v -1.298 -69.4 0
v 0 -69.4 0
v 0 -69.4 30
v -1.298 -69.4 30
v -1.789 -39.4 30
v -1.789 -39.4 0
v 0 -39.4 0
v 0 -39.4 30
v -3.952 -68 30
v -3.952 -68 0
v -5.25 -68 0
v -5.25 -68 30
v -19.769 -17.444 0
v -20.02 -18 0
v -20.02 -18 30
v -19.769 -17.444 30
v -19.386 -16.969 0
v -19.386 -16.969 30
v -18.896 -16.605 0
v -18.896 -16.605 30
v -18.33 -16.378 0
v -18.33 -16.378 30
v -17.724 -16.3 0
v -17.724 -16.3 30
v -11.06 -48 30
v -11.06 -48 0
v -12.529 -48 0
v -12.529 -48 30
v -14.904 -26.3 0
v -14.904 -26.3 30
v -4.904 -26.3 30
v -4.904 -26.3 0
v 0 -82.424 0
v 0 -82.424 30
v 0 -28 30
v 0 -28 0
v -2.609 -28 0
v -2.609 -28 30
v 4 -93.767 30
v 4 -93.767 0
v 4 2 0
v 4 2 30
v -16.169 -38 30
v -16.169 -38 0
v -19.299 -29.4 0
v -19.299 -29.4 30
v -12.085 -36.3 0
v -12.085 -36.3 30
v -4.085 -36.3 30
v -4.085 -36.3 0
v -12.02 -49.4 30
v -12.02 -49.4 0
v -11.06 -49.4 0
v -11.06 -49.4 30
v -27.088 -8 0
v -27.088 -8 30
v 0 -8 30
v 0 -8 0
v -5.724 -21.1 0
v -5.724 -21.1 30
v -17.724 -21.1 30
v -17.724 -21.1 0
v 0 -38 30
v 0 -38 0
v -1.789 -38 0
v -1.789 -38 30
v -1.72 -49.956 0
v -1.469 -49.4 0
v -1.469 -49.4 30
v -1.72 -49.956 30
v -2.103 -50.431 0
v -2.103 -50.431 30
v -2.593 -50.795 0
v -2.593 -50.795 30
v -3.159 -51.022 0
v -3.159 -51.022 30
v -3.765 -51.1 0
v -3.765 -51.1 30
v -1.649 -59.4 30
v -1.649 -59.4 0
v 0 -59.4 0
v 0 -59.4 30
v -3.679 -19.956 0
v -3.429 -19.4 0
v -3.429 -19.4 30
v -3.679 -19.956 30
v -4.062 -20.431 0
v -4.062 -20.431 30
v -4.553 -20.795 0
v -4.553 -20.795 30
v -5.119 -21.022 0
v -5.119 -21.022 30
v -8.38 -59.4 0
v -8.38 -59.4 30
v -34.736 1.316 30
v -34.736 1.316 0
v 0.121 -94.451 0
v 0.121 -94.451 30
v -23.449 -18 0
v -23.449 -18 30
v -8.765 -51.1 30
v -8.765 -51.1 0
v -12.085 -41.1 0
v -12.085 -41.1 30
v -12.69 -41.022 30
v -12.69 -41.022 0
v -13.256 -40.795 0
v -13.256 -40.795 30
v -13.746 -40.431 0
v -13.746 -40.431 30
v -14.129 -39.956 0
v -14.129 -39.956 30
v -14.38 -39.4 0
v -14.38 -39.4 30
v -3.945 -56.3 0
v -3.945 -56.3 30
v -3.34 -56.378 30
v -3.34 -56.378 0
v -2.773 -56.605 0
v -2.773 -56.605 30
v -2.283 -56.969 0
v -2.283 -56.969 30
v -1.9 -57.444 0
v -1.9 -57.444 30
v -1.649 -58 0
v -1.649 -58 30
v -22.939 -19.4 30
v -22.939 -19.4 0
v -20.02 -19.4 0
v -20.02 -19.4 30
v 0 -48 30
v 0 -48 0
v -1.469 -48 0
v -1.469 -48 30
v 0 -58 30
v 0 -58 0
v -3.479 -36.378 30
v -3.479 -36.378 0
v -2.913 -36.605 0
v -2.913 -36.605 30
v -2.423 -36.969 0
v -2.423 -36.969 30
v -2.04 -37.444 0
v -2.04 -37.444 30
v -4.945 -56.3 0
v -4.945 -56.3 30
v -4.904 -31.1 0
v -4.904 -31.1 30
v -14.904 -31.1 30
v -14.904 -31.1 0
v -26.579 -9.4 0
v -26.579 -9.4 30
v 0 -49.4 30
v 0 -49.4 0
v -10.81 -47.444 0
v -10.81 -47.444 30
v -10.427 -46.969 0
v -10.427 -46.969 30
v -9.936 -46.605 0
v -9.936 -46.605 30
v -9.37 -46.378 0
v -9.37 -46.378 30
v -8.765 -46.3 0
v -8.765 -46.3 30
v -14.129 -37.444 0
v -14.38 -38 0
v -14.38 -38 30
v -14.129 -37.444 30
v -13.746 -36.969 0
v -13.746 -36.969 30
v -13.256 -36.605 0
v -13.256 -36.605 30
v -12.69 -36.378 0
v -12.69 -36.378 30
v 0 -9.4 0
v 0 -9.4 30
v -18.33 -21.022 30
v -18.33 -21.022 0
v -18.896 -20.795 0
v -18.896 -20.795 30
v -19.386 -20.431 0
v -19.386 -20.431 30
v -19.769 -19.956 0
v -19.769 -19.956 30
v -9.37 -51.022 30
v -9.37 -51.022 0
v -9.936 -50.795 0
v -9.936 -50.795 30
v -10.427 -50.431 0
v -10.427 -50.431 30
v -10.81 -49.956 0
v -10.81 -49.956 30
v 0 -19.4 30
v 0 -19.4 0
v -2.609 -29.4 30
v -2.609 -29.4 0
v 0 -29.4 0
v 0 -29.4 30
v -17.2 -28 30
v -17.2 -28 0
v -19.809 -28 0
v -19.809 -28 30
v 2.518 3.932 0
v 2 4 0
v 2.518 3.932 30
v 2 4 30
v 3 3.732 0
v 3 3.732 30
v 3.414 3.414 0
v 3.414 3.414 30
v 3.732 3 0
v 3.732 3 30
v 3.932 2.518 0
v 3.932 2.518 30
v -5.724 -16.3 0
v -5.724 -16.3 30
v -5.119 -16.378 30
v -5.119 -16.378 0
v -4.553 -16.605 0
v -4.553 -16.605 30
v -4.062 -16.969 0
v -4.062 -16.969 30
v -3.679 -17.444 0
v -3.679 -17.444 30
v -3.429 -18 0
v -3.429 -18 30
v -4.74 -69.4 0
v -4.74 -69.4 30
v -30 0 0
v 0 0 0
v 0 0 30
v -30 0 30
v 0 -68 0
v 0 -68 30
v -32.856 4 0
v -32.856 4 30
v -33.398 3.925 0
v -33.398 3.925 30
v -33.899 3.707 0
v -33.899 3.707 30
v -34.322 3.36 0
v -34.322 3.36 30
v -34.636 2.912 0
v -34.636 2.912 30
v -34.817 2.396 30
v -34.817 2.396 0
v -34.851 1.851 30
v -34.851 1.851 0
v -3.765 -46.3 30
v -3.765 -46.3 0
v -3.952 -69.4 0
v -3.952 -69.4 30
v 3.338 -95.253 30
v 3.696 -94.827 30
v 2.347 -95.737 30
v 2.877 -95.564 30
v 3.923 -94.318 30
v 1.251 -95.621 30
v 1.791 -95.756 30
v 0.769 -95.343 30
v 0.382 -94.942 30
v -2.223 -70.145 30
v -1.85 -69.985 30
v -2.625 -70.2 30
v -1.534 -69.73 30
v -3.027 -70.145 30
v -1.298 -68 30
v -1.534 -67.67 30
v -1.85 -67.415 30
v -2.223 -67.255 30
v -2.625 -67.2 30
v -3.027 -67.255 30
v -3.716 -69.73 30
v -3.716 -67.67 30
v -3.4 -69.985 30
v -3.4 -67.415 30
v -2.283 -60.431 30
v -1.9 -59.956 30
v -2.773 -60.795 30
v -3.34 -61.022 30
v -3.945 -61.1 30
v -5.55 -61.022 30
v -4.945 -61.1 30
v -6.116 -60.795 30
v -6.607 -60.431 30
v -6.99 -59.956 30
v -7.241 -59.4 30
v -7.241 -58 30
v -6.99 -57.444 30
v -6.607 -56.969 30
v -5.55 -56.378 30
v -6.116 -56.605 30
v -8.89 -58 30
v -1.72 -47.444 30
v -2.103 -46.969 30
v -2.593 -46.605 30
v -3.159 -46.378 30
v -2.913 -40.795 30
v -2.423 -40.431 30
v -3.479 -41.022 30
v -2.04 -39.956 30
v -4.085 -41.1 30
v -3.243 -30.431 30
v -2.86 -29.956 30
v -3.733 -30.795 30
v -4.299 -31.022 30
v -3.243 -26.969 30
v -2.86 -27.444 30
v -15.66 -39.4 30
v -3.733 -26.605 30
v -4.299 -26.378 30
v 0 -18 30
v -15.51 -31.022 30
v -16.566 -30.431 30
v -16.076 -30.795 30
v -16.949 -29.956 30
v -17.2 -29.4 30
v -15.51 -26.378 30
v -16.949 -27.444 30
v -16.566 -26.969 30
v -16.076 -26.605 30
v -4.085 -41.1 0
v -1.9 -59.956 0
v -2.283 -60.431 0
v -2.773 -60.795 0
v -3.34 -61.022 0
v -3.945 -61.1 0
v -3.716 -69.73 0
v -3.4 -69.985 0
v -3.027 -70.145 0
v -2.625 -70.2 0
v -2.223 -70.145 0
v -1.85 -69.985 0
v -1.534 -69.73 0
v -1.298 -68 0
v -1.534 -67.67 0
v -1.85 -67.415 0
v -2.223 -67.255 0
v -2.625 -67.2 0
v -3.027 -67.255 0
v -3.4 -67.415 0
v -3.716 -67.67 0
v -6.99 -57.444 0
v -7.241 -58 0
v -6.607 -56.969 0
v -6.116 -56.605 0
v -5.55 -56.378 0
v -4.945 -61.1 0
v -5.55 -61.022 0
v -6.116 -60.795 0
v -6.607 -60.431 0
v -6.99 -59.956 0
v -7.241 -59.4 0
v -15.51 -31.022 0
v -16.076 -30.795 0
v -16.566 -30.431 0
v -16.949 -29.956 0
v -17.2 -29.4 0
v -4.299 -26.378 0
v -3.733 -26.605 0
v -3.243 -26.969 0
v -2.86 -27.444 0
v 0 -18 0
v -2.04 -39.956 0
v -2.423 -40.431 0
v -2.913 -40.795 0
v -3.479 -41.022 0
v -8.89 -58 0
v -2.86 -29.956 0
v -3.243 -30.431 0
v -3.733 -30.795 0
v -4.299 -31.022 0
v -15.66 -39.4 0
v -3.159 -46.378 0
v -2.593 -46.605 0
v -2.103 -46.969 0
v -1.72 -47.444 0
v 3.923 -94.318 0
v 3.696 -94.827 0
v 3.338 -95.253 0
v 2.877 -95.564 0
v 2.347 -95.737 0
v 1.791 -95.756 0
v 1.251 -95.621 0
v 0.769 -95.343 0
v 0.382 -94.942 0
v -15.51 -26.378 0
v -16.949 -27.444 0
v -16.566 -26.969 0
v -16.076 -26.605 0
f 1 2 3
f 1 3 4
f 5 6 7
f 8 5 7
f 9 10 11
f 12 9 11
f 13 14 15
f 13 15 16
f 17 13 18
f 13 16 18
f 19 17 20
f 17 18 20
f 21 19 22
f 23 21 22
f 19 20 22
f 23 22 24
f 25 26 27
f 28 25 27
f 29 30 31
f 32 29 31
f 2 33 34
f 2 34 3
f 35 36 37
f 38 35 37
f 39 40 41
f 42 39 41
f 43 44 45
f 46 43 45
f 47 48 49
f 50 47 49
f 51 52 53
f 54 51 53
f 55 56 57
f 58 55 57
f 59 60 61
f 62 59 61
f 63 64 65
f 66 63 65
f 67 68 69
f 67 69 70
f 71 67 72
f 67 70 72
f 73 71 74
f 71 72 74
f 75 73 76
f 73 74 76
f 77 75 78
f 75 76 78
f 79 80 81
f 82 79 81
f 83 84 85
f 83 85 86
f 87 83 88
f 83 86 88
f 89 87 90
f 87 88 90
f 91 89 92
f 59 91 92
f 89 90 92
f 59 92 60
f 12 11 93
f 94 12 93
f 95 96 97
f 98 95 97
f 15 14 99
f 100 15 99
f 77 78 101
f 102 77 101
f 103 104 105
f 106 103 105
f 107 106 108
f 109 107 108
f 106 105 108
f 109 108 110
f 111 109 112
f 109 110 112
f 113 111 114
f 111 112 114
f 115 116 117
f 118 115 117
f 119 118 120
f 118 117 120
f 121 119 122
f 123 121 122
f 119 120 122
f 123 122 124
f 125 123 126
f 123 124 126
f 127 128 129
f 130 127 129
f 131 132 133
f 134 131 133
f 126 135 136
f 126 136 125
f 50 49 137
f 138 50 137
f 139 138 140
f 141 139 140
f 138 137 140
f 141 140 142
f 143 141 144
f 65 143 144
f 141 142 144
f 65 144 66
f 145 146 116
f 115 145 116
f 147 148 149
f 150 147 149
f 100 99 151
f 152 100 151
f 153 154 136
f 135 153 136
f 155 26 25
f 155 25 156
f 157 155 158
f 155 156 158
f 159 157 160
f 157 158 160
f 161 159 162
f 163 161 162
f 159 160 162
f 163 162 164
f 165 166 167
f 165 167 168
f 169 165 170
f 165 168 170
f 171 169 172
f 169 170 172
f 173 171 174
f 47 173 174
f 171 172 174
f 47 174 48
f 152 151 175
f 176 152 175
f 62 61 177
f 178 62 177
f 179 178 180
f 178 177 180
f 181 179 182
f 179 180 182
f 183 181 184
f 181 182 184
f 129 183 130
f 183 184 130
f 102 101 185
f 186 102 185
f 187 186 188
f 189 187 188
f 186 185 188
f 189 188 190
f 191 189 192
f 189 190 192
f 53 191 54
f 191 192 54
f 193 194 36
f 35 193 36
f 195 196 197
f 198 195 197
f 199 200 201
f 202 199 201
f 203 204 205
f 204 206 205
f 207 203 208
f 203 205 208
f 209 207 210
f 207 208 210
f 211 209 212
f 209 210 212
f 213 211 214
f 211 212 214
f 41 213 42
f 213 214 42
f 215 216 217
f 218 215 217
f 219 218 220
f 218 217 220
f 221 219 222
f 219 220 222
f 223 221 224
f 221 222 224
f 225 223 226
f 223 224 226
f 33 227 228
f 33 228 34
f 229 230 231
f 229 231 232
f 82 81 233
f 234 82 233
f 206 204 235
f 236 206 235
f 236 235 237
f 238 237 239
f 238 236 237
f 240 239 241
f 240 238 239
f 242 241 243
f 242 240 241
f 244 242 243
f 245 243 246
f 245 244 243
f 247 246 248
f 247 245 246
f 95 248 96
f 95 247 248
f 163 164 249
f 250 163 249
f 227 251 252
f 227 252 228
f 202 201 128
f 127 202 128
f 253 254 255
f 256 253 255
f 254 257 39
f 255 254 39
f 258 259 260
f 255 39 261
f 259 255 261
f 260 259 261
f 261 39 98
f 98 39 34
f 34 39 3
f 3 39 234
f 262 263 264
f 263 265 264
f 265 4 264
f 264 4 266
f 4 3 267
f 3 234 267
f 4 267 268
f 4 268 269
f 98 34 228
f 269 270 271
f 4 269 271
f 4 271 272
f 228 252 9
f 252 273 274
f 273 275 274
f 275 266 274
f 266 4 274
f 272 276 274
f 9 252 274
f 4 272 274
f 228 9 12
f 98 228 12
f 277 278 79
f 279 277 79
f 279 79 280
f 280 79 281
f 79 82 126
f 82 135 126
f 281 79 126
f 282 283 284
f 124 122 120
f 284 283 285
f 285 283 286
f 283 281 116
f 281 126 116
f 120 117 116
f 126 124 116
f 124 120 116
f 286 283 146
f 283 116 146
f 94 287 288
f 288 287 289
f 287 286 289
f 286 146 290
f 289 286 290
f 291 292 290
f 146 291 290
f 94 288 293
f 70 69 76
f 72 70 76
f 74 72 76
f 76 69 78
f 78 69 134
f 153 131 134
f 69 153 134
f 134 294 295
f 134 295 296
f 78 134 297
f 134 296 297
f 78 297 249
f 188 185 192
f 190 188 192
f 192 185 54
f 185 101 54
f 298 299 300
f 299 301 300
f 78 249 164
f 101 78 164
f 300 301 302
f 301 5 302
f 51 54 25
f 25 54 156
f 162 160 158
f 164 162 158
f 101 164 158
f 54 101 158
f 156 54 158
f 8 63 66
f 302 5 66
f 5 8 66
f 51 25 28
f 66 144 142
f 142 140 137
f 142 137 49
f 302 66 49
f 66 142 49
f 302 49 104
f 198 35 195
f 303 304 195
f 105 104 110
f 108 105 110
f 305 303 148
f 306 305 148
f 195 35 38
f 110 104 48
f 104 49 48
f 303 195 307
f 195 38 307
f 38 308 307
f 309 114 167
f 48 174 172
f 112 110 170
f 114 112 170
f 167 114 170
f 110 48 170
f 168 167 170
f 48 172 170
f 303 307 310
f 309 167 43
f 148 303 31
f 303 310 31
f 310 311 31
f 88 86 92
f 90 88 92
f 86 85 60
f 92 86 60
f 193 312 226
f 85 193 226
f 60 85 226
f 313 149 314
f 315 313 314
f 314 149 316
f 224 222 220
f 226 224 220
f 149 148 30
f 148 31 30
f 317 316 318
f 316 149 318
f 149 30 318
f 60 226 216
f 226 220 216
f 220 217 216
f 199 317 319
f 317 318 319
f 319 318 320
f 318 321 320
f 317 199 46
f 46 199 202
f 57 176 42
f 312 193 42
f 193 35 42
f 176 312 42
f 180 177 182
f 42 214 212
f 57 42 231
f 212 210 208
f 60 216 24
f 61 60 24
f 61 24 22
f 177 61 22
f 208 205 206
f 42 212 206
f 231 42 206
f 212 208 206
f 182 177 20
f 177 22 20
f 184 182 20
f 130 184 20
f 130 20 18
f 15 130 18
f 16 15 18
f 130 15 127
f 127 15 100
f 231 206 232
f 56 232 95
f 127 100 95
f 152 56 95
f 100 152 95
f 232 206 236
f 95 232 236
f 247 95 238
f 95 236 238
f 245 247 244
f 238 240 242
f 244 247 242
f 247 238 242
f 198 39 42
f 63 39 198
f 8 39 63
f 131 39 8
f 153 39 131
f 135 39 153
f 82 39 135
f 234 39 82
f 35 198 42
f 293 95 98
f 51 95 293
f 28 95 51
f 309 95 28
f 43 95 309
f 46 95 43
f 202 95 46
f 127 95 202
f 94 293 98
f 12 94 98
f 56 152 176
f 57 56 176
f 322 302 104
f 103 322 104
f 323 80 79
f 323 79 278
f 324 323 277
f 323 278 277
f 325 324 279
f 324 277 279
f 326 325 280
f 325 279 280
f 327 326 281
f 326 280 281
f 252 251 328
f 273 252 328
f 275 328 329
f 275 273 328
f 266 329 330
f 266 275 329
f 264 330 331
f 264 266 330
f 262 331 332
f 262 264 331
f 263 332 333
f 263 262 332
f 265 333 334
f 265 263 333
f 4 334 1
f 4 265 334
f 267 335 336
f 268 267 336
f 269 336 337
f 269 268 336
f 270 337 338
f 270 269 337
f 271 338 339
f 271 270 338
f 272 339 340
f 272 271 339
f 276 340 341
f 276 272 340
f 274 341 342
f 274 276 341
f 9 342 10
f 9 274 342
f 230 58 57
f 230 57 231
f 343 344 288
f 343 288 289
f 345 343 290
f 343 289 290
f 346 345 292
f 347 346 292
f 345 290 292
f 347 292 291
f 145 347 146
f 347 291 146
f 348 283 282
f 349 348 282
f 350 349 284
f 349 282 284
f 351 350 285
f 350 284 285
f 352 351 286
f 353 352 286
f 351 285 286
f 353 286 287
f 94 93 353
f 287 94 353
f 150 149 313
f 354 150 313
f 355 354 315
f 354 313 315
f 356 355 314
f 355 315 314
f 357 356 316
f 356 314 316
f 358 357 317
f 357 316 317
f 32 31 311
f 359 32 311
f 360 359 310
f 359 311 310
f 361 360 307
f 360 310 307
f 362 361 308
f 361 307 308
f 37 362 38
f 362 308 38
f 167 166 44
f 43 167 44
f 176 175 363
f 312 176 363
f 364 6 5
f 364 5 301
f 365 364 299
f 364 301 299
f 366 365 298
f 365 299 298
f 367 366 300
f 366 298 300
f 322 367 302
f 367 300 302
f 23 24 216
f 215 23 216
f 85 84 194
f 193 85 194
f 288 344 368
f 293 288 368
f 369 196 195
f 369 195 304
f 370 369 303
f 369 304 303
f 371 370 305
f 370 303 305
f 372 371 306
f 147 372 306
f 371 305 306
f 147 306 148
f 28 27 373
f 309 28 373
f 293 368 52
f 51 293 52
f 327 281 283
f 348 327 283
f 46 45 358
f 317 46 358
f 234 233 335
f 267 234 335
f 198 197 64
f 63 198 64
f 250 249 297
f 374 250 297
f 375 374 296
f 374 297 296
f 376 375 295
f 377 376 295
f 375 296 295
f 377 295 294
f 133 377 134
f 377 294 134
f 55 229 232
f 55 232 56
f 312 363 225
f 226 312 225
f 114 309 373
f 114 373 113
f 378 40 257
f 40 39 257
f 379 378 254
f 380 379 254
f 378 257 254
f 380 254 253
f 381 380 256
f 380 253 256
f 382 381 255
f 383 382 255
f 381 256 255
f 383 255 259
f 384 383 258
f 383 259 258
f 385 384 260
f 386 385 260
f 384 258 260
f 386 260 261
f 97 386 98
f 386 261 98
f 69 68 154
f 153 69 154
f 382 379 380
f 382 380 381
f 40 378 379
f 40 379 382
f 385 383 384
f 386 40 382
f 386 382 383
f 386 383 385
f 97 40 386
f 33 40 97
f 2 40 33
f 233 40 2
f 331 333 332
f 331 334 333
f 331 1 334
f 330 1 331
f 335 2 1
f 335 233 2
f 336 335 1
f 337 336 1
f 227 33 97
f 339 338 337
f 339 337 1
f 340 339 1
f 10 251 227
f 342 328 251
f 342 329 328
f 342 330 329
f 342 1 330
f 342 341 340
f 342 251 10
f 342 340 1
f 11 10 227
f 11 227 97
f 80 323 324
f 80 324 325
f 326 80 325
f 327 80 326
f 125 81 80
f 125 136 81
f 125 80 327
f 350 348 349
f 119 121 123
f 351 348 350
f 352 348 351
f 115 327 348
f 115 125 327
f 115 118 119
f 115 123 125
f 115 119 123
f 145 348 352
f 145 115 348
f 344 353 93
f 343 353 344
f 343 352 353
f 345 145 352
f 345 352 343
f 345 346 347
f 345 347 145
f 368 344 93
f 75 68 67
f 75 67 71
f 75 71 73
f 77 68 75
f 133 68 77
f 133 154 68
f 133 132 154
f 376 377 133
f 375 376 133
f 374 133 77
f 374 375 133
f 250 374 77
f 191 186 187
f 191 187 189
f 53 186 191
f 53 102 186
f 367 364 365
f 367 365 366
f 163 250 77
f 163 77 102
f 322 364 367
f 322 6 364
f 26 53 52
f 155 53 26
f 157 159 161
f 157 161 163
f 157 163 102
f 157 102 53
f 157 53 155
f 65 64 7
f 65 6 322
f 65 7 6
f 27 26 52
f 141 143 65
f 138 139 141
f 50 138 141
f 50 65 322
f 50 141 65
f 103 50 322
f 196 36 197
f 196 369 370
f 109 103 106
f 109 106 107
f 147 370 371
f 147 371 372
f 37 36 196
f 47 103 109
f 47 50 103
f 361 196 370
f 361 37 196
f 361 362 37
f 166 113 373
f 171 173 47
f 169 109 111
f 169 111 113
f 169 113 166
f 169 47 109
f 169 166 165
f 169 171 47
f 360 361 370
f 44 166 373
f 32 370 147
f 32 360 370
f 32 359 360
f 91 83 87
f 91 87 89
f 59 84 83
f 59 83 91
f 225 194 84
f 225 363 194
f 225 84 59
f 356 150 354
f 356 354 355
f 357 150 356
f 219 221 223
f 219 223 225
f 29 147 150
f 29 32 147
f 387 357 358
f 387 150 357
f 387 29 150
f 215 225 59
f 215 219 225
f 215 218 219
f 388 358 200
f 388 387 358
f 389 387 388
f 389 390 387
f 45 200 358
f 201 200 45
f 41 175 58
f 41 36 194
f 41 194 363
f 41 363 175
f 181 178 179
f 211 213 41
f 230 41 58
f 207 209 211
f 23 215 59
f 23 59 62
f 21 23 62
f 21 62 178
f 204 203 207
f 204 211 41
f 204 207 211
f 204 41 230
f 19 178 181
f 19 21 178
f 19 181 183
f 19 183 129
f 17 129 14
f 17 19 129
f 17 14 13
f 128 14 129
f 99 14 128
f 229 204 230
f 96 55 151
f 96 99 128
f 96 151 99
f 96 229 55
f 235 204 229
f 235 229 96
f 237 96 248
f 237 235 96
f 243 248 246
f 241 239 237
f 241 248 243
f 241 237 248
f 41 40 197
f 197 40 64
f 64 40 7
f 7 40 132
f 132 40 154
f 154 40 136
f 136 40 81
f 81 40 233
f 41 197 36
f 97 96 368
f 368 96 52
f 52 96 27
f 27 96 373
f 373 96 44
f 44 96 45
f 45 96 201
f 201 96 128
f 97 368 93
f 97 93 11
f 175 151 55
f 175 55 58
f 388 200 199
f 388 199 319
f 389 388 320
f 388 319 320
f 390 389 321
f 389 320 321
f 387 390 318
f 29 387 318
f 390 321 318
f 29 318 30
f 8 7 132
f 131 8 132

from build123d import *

# Parameters (mm, degrees)
BOSS_EXTRUDE2_DEPTH = 30
FILLET2_R           = 2
BOSS_EXTRUDE3_DEPTH = 30
SKETCH5_R           = 1.5
BOSS_EXTRUDE4_DEPTH = 30


with BuildPart() as part:
    # Sketch1 → Boss-Extrude2 (new body)
    with BuildSketch(Plane.XY):
        Polygon((4, 4), (-35.712592027, 4), (4, -105.109449862), align=None)
        Polygon((0, 0), (-30, 0), (-27.088238126, -8), (0, -8), align=None, mode=Mode.SUBTRACT)
        Polygon((0, -82.424322584), (0, -69.4), (-4.740465742, -69.4), align=None, mode=Mode.SUBTRACT)
        Polygon((-26.578679798, -9.4), (0, -9.4), (0, -18), (-23.448535783, -18), align=None, mode=Mode.SUBTRACT)
        Polygon((-22.938977455, -19.4), (0, -19.4), (0, -28), (-19.808833441, -28), align=None, mode=Mode.SUBTRACT)
        Polygon((-19.299275113, -29.4), (0, -29.4), (0, -38), (-16.169131098, -38), align=None, mode=Mode.SUBTRACT)
        Polygon((-15.65957277, -39.4), (0, -39.4), (0, -48), (-12.529428755, -48), align=None, mode=Mode.SUBTRACT)
        Polygon((-12.019870427, -49.4), (0, -49.4), (0, -58), (-8.889726413, -58), align=None, mode=Mode.SUBTRACT)
        Polygon((-8.380168085, -59.4), (0, -59.4), (0, -68), (-5.25002407, -68), align=None, mode=Mode.SUBTRACT)
    extrude(amount=BOSS_EXTRUDE2_DEPTH)

    # Fillet2
    fillet2_edges = [part.edges().sort_by_distance(p)[0] for p in [
        (-35.712592027, 4, 15),
        (4, 4, 15),
        (4, -105.109449862, 15),
    ]]
    fillet(fillet2_edges, radius=FILLET2_R)

    # Sketch4 → Boss-Extrude3 (add)
    with BuildSketch(Plane.XY.offset(30)):
        with BuildLine():
            Line((-14.90441672, -26.3), (-4.90441672, -26.3))
            ThreePointArc((-4.90441672, -26.3), (-2.50441672, -28.7), (-4.90441672, -31.1))
            Line((-4.90441672, -31.1), (-14.90441672, -31.1))
            ThreePointArc((-14.90441672, -31.1), (-17.30441672, -28.7), (-14.90441672, -26.3))
        make_face()
        with BuildLine():
            Line((-4.084565549, -41.1), (-12.084565549, -41.1))
            ThreePointArc((-12.084565549, -41.1), (-14.484565549, -38.7), (-12.084565549, -36.3))
            Line((-12.084565549, -36.3), (-4.084565549, -36.3))
            ThreePointArc((-4.084565549, -36.3), (-1.684565549, -38.7), (-4.084565549, -41.1))
        make_face()
        with BuildLine():
            Line((-8.764714378, -46.3), (-3.764714378, -46.3))
            ThreePointArc((-3.764714378, -46.3), (-1.364714378, -48.7), (-3.764714378, -51.1))
            Line((-3.764714378, -51.1), (-8.764714378, -51.1))
            ThreePointArc((-8.764714378, -51.1), (-11.164714378, -48.7), (-8.764714378, -46.3))
        make_face()
        with BuildLine():
            Line((-4.944863206, -56.3), (-3.944863206, -56.3))
            ThreePointArc((-3.944863206, -56.3), (-1.544863206, -58.7), (-3.944863206, -61.1))
            Line((-3.944863206, -61.1), (-4.944863206, -61.1))
            ThreePointArc((-4.944863206, -61.1), (-7.344863206, -58.7), (-4.944863206, -56.3))
        make_face()
        with BuildLine():
            Line((-5.724267892, -21.1), (-17.724267892, -21.1))
            ThreePointArc((-17.724267892, -21.1), (-20.124267892, -18.7), (-17.724267892, -16.3))
            Line((-17.724267892, -16.3), (-5.724267892, -16.3))
            ThreePointArc((-5.724267892, -16.3), (-3.324267892, -18.7), (-5.724267892, -21.1))
        make_face()
    extrude(amount=-BOSS_EXTRUDE3_DEPTH)

    # Sketch5 → Boss-Extrude4 (add)
    with BuildSketch(Plane.XY.offset(30)):
        with Locations((-2.625012035, -68.7)):
            Circle(SKETCH5_R)
    extrude(amount=-BOSS_EXTRUDE4_DEPTH)


solid = part.part
